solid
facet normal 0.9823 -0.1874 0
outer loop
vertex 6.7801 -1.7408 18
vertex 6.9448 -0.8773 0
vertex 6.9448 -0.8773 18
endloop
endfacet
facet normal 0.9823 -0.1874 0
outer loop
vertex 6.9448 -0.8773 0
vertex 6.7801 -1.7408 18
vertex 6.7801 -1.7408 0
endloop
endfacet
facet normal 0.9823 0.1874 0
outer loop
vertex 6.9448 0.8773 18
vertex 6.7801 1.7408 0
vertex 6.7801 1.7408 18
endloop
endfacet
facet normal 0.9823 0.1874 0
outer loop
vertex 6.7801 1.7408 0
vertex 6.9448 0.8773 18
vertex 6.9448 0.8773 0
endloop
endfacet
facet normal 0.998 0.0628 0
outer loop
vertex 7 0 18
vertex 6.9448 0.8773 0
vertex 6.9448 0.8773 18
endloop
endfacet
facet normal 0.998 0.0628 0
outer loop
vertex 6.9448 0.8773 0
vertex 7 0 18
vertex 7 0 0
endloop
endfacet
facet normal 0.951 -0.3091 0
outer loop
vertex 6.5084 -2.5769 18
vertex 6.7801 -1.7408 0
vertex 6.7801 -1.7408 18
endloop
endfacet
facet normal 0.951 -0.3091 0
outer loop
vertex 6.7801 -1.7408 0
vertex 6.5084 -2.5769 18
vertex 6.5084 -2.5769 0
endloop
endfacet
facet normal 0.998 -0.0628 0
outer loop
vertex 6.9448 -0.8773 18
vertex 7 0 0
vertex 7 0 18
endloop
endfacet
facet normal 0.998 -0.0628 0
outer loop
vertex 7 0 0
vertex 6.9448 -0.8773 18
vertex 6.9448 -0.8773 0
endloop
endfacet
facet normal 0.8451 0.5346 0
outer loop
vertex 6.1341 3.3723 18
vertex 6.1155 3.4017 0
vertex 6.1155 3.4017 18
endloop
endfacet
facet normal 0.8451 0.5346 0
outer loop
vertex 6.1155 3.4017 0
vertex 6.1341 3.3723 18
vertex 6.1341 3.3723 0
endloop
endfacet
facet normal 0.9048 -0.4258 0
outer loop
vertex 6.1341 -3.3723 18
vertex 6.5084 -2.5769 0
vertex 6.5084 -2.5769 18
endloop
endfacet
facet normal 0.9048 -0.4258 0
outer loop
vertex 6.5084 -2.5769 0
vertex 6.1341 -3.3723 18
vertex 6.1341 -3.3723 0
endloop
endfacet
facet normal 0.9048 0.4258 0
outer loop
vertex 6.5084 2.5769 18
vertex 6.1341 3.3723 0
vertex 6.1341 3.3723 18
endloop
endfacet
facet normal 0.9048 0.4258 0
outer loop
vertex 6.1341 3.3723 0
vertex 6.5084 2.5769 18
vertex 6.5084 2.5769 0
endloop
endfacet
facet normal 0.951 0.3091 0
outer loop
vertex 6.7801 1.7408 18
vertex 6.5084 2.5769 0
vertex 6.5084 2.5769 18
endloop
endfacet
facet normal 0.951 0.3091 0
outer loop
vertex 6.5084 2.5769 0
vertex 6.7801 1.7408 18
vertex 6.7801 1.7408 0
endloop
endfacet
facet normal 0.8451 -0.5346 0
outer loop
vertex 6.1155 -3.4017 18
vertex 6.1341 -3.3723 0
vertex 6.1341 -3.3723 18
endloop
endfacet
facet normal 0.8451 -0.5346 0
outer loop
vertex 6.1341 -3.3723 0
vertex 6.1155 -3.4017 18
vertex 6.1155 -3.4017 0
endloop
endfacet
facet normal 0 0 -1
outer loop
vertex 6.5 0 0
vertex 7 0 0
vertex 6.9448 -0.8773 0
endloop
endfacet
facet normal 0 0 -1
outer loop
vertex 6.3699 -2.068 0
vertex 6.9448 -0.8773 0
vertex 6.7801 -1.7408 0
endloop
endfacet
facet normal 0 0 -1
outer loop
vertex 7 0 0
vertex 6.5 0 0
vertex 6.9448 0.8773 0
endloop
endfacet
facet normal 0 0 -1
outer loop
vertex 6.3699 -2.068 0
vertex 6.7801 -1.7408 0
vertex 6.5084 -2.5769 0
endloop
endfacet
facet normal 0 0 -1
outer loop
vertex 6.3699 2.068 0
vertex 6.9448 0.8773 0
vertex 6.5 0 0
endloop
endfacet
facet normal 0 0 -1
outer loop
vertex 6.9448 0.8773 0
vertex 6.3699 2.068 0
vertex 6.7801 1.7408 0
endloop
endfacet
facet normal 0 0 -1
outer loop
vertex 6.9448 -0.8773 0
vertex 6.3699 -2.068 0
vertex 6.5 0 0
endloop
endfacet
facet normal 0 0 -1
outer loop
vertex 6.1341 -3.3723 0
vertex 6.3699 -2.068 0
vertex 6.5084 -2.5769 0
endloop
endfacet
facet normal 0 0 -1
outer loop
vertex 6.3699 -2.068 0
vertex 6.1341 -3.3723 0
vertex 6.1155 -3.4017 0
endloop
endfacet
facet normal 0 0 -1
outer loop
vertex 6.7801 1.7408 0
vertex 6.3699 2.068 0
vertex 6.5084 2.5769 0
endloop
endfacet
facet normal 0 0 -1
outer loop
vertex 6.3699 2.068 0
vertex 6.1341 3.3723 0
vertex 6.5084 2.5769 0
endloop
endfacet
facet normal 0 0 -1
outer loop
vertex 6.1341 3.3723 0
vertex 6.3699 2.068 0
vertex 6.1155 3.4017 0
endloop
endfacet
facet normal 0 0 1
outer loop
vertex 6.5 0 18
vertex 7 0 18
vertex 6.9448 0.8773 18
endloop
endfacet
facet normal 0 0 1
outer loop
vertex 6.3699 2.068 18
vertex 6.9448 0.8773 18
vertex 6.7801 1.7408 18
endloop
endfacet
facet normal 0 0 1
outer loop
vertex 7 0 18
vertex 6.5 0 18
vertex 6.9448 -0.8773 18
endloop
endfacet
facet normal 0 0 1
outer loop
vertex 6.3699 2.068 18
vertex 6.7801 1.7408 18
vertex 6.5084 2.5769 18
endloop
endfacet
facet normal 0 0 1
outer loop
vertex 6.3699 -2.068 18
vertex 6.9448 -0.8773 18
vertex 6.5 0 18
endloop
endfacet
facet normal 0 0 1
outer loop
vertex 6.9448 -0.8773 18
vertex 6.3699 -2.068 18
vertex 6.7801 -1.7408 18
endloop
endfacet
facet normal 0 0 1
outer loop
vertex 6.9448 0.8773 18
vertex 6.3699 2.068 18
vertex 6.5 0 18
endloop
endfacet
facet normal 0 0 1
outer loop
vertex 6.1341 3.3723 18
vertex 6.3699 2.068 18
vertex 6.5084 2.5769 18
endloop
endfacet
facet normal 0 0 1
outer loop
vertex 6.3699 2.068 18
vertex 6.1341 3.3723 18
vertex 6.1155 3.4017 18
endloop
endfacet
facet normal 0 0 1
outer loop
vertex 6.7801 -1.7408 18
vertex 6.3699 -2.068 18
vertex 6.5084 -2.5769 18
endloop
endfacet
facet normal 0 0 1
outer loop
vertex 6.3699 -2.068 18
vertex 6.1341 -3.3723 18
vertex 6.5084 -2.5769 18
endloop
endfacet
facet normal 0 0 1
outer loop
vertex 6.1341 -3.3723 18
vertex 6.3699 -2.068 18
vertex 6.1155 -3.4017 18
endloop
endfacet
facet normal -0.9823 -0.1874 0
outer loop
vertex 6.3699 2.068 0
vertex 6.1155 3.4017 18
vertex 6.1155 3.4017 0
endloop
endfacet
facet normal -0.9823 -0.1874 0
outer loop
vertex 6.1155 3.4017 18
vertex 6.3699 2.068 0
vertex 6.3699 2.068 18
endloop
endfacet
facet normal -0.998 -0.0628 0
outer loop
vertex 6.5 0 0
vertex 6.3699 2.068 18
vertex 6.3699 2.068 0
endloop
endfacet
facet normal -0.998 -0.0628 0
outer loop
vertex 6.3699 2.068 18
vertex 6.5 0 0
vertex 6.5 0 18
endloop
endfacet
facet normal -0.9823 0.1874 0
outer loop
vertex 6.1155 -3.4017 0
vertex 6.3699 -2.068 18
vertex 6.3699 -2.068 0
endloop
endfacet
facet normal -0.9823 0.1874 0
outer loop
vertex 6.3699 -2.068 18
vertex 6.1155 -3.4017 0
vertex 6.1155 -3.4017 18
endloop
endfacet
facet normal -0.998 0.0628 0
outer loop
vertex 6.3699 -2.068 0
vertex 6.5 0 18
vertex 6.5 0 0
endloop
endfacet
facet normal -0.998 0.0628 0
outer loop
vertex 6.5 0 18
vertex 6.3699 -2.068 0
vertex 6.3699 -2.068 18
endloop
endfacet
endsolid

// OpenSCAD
$fn = 50;


difference() {
	union() {
		cylinder(h = 18, r = 7.0000000000);
		translate(v = [-13.0000000000, 0, 0]) {
			cylinder(h = 18, r = 7.0000000000);
		}
	}
	union() {
		cylinder(h = 18, r = 3.2500000000);
		cylinder(h = 18, r = 1.8000000000);
		cylinder(h = 18, r = 1.8000000000);
		cylinder(h = 18, r = 1.8000000000);
		translate(v = [-17.5000000000, 0, 0]) {
			hull() {
				translate(v = [-3.7500000000, 0.0000000000, 0]) {
					cylinder(h = 18, r = 10.5000000000);
				}
				translate(v = [3.7500000000, 0.0000000000, 0]) {
					cylinder(h = 18, r = 10.5000000000);
				}
				translate(v = [-3.7500000000, -0.0000000000, 0]) {
					cylinder(h = 18, r = 10.5000000000);
				}
				translate(v = [3.7500000000, -0.0000000000, 0]) {
					cylinder(h = 18, r = 10.5000000000);
				}
			}
		}
		translate(v = [-10.0000000000, 0, 0.0000000000]) {
			cylinder(h = 18, r = 16.5000000000);
		}
	}
}
